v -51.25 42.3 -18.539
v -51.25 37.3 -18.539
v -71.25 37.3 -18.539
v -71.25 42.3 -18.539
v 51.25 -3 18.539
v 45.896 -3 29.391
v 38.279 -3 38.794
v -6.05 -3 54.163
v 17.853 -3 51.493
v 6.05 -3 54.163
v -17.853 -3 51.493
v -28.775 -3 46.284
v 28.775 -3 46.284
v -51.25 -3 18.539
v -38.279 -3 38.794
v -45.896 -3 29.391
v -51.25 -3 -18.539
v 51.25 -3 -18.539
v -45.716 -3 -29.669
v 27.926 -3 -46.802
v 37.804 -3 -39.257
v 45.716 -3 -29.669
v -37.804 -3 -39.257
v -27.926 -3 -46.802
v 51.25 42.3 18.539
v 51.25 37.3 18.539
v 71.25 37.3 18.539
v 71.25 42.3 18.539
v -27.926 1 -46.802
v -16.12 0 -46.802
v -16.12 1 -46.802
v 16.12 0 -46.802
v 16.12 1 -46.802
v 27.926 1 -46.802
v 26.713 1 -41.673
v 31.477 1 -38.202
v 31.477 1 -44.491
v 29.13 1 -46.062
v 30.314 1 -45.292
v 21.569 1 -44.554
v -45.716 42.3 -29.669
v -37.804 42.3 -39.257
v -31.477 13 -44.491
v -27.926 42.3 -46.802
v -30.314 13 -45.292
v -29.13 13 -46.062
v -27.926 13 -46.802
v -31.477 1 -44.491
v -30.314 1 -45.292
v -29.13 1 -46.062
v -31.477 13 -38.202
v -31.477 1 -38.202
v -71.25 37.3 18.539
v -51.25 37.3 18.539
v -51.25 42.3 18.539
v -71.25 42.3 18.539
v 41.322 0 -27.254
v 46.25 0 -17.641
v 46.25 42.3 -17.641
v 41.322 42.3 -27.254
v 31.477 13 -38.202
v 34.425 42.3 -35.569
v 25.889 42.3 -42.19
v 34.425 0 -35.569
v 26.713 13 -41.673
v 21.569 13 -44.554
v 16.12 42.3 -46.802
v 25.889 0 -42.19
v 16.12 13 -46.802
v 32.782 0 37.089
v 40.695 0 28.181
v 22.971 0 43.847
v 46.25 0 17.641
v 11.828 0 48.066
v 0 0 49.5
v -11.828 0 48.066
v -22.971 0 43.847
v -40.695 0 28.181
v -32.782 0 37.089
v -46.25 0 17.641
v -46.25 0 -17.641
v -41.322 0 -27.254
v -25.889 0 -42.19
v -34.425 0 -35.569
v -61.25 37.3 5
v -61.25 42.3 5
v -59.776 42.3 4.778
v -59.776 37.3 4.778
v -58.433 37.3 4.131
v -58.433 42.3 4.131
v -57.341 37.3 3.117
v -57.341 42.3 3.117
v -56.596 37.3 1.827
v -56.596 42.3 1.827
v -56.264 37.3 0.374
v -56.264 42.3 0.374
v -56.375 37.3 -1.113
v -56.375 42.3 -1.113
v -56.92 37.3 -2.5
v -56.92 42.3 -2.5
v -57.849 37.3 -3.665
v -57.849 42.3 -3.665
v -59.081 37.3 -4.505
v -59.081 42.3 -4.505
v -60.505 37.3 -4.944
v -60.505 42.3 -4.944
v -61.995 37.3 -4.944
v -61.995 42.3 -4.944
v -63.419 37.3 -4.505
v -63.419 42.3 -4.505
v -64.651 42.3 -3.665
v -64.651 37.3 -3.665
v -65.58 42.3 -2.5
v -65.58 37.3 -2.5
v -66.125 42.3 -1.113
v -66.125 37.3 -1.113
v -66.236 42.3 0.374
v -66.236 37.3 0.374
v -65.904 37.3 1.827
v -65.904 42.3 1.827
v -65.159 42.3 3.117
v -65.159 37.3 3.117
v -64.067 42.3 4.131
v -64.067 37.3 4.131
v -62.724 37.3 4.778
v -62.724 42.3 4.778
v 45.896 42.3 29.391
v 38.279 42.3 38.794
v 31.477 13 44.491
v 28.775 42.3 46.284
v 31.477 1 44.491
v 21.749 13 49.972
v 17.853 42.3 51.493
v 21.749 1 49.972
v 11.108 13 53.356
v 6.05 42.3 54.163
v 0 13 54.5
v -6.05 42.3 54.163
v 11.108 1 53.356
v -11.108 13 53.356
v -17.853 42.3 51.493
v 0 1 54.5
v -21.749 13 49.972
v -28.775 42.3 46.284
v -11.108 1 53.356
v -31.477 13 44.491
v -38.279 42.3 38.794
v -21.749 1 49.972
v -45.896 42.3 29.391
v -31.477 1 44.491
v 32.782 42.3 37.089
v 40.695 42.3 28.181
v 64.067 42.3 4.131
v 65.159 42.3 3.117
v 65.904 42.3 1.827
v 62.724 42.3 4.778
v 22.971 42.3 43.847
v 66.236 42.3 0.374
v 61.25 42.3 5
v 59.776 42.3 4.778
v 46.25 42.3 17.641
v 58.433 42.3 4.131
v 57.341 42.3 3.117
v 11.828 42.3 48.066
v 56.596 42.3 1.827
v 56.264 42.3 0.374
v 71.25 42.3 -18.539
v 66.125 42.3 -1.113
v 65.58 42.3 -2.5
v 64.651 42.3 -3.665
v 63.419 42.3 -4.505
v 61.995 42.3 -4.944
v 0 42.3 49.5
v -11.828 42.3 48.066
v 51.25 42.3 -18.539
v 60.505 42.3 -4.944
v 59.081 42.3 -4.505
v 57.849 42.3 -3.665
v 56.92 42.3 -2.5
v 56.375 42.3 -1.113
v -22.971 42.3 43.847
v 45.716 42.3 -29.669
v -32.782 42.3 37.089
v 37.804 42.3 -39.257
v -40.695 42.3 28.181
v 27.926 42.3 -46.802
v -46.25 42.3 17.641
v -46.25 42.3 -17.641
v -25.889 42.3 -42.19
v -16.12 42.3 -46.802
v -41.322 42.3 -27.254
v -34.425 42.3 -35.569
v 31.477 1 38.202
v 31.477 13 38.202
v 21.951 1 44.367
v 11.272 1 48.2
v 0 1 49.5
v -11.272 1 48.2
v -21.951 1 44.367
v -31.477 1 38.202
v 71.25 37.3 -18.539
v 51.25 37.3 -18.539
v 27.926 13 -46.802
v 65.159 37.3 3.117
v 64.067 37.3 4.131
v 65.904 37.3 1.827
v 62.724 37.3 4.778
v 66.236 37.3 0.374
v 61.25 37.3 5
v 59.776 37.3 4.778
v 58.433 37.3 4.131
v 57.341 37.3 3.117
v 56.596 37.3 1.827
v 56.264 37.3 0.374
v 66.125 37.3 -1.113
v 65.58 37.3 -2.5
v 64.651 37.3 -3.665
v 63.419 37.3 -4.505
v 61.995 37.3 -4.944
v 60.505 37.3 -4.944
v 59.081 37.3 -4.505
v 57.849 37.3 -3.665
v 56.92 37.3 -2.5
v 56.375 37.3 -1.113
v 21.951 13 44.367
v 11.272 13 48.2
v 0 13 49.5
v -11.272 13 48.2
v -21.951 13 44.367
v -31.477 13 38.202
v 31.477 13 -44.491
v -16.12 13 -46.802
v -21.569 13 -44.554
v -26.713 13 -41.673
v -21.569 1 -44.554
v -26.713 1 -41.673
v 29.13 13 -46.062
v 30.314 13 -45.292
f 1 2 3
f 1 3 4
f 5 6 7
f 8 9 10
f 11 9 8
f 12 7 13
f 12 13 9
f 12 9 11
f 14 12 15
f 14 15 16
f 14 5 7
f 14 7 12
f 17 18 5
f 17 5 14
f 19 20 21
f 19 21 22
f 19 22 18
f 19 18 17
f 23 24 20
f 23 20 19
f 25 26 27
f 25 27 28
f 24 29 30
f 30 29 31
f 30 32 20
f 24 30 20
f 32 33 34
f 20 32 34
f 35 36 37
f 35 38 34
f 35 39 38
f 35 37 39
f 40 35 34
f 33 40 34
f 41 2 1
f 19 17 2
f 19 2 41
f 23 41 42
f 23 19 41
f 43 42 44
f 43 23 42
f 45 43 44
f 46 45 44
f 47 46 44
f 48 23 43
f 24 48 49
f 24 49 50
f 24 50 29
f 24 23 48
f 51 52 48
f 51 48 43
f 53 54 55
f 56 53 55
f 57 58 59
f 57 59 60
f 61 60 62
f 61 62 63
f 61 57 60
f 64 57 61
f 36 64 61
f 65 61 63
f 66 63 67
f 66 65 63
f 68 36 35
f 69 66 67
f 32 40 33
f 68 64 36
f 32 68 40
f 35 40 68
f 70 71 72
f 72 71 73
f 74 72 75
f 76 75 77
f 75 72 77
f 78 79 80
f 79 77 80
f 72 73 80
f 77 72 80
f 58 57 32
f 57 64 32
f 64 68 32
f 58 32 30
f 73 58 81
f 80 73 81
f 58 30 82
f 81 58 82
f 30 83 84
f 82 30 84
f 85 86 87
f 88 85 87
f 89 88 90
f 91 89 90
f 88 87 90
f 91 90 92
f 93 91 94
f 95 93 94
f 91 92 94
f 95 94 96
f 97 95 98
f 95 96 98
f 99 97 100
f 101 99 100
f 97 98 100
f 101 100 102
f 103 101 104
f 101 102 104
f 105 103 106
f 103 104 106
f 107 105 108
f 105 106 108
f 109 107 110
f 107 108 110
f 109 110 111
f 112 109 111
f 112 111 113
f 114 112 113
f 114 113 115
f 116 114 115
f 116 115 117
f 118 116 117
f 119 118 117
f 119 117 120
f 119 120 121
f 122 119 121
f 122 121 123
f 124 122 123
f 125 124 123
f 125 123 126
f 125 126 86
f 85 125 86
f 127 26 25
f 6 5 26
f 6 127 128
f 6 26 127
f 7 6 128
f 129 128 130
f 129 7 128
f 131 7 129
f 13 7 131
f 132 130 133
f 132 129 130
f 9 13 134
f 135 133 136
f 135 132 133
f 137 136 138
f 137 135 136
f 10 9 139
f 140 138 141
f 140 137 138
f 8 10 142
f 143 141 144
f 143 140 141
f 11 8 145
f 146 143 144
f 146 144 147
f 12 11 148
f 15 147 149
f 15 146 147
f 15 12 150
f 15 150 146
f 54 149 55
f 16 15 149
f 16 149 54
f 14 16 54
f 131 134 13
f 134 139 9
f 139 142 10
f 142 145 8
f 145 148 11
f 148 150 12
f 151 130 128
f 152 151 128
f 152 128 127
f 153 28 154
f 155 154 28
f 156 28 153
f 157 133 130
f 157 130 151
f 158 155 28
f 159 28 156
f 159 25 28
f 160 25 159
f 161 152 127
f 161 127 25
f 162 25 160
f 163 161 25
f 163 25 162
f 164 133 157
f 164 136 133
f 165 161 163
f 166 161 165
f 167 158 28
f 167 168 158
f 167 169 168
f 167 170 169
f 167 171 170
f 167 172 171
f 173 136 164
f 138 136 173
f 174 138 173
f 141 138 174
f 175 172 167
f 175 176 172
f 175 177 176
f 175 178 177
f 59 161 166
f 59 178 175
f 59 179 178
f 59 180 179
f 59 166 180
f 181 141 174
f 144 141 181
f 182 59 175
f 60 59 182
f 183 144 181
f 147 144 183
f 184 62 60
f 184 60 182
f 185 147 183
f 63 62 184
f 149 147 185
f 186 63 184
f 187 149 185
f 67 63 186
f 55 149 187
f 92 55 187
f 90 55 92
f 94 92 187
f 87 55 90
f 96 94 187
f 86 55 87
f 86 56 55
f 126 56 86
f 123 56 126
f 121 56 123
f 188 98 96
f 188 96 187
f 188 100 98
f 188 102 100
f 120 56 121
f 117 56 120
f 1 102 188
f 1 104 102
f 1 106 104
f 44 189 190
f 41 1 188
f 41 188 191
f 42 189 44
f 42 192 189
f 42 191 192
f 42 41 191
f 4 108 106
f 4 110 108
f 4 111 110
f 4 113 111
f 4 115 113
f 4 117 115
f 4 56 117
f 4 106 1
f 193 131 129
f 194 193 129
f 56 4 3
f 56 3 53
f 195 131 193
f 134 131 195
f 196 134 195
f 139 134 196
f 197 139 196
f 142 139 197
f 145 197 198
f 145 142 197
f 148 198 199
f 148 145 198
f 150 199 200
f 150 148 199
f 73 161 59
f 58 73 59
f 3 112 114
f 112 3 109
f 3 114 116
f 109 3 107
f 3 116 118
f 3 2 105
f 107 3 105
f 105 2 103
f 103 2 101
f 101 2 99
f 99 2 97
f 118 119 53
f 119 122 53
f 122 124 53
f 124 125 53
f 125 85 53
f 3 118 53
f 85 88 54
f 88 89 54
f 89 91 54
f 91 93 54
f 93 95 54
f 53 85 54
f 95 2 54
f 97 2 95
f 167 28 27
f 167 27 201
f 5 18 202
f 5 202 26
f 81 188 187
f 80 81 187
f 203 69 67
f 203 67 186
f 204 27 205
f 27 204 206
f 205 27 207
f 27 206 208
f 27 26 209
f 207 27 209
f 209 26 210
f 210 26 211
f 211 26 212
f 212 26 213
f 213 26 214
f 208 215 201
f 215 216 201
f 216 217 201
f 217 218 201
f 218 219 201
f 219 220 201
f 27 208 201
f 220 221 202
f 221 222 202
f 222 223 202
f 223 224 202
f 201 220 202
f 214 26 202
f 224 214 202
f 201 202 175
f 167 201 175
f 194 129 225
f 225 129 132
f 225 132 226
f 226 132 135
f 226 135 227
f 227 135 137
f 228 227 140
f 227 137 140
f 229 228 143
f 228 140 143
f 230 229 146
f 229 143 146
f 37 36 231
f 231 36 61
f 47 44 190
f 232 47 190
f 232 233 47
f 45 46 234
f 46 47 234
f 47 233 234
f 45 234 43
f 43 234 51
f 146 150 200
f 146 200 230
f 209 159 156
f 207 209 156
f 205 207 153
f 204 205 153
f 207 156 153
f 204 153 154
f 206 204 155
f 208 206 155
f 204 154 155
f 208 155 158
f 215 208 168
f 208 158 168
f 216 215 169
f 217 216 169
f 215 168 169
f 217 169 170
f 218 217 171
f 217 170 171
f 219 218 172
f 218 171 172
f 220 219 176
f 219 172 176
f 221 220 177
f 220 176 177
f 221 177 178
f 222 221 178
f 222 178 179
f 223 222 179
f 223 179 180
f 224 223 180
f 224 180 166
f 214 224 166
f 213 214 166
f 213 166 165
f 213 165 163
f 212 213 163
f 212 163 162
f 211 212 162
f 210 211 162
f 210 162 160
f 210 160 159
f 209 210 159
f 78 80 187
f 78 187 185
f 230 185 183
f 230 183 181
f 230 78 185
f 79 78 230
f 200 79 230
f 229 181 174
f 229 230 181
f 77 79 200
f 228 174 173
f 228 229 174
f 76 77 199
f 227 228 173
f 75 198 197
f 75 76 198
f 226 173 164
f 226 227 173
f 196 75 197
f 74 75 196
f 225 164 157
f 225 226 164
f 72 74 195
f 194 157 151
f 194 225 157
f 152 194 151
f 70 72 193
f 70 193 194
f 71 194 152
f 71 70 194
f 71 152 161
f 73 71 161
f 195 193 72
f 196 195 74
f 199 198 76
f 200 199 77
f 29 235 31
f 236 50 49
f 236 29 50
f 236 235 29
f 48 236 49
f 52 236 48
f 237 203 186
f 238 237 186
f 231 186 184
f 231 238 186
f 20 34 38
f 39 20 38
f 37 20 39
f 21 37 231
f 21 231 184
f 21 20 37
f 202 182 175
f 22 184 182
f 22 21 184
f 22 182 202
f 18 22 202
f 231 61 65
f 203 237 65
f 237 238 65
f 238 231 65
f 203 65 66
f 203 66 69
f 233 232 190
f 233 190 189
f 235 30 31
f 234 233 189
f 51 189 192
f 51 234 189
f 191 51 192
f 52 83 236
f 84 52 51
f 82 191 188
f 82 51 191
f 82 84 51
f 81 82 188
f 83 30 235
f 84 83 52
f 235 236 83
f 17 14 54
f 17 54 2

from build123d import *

# Parameters (mm, degrees)
EXTRUDE_1_DEPTH          = 42.3
EXTRUDE_START            = 3
EXTRUDE_2_DEPTH          = 3
SKETCH_3_W               = 37.077621282
SKETCH_3_H               = 5
EXTRUDE_4_DEPTH          = 20
SKETCH_5_W               = 37.077621282
SKETCH_5_H               = 5
EXTRUDE_5_DEPTH          = 20
CUT_EXTRUDE_1_REACH      = 102.493
SKETCH_6_R               = 5
CUT_EXTRUDE_2_REACH      = 102.493
SKETCH_7_R               = 5
CUT_EXTRUDE_3_DEPTH      = 137.919145849
CUT_EXTRUDE_3_DEPTH_BACK = 137.919145849
SKETCH_9_W               = 62.954996742
SKETCH_9_H               = 12
CUT_EXTRUDE_4_DEPTH      = 101.493295796
CUT_EXTRUDE_4_DEPTH_BACK = 101.493295796
CUT_EXTRUDE_5_DEPTH      = 101.493295796
CUT_EXTRUDE_5_DEPTH_BACK = 101.493295796
SKETCH_11_W              = 70.692803697
SKETCH_11_H              = 7.082333279


with BuildPart() as part:
    # 草图1 → 凸台-拉伸1 (new body)
    with BuildSketch(Plane(origin=(0, 0, 0), x_dir=(1, 0, 0), z_dir=(0, 1, 0))):
        with BuildLine():
            Line((-51.25, 18.538810641), (-51.25, -18.538810641))
            ThreePointArc((-51.25, -18.538810641), (0, -54.5), (51.25, -18.538810641))
            Line((51.25, -18.538810641), (51.25, 18.538810641))
            ThreePointArc((51.25, 18.538810641), (0, 54.5), (-51.25, 18.538810641))
        make_face()
        with BuildLine():
            Line((-46.25, 17.640507362), (-46.25, -17.640507362))
            ThreePointArc((-46.25, -17.640507362), (0, -49.5), (46.25, -17.640507362))
            Line((46.25, -17.640507362), (46.25, 17.640507362))
            ThreePointArc((46.25, 17.640507362), (0, 49.5), (-46.25, 17.640507362))
        make_face(mode=Mode.SUBTRACT)
    extrude(amount=EXTRUDE_1_DEPTH)

    # 草图2 → 凸台-拉伸2 (add)
    with BuildSketch(Plane(origin=(0, 0, 0), x_dir=(-1, 0, 0), z_dir=(0, -1, 0)).offset(EXTRUDE_START)):
        with BuildLine():
            Line((51.25, -18.538810641), (51.25, 18.538810641))
            ThreePointArc((51.25, 18.538810641), (0, 54.5), (-51.25, 18.538810641))
            Line((-51.25, 18.538810641), (-51.25, -18.538810641))
            ThreePointArc((-51.25, -18.538810641), (0, -54.5), (51.25, -18.538810641))
        make_face()
    extrude(amount=-EXTRUDE_2_DEPTH)

    # 草图3 → 凸台-拉伸4 (add)
    with BuildSketch(Plane.ZY.offset(51.25)):
        with Locations((0, 39.8)):
            Rectangle(SKETCH_3_W, SKETCH_3_H)
    extrude(amount=EXTRUDE_4_DEPTH)

    # 草图5 → 凸台-拉伸5 (add)
    with BuildSketch(Plane(origin=(51.25, 0, 0), x_dir=(0, 0, -1), z_dir=(1, 0, 0))):
        with Locations((0, 39.8)):
            Rectangle(SKETCH_5_W, SKETCH_5_H)
    extrude(amount=EXTRUDE_5_DEPTH)

    # 草图6 → 切除-拉伸1 (cut, up to next)
    with BuildSketch(Plane(origin=(0, 42.3, 0), x_dir=(1, 0, 0), z_dir=(0, 1, 0)), mode=Mode.PRIVATE) as cut_extrude_1_sk1:
        with Locations(Location((-61.25, 0, 0), (0, 0, 270))):
            Circle(SKETCH_6_R)
    cut_extrude_1_tool1 = extrude(cut_extrude_1_sk1.sketch, amount=-CUT_EXTRUDE_1_REACH, mode=Mode.PRIVATE) & part.part
    add(cut_extrude_1_tool1.solids().sort_by_distance((-61.25, 42.3, 0))[0], mode=Mode.SUBTRACT)

    # 草图7 → 切除-拉伸2 (cut, up to next)
    with BuildSketch(Plane(origin=(0, 42.3, 0), x_dir=(1, 0, 0), z_dir=(0, 1, 0)), mode=Mode.PRIVATE) as cut_extrude_2_sk1:
        with Locations(Location((61.25, 0, 0), (0, 0, 270))):
            Circle(SKETCH_7_R)
    cut_extrude_2_tool1 = extrude(cut_extrude_2_sk1.sketch, amount=-CUT_EXTRUDE_2_REACH, mode=Mode.PRIVATE) & part.part
    add(cut_extrude_2_tool1.solids().sort_by_distance((61.25, 42.3, 0))[0], mode=Mode.SUBTRACT)

    # 草图9 → 切除-拉伸3 (cut, two sides: drawn at the far end of the back side and taken through both)
    with BuildSketch(Plane(origin=(0, 0, -54.5), x_dir=(-1, 0, 0), z_dir=(0, 0, -1)).offset(-CUT_EXTRUDE_3_DEPTH_BACK)):
        with Locations((0, 7)):
            Rectangle(SKETCH_9_W, SKETCH_9_H)
    extrude(amount=CUT_EXTRUDE_3_DEPTH + CUT_EXTRUDE_3_DEPTH_BACK, mode=Mode.SUBTRACT)

    # 草图10 → 切除-拉伸4 (cut, two sides: drawn at the far end of the back side and taken through both)
    with BuildSketch(Plane.XZ.offset(3).offset(-CUT_EXTRUDE_4_DEPTH_BACK)):
        with BuildLine():
            Line((21.685248442, -50), (-21.685248442, -50))
            ThreePointArc((-21.685248442, -50), (-11.073617375, -53.363142694), (-1.63e-07, -54.5))
            ThreePointArc((-1.63e-07, -54.5), (11.073617215, -53.363142728), (21.685248442, -50))
        make_face()
    extrude(amount=CUT_EXTRUDE_4_DEPTH + CUT_EXTRUDE_4_DEPTH_BACK, mode=Mode.SUBTRACT)

    # 草图11 → 切除-拉伸5 (cut, two sides: drawn at the far end of the back side and taken through both)
    with BuildSketch(Plane.XZ.offset(3).offset(-CUT_EXTRUDE_5_DEPTH_BACK)):
        with Locations((7.420622122, -50.342884842)):
            Rectangle(SKETCH_11_W, SKETCH_11_H)
    extrude(amount=CUT_EXTRUDE_5_DEPTH + CUT_EXTRUDE_5_DEPTH_BACK, mode=Mode.SUBTRACT)


solid = part.part
